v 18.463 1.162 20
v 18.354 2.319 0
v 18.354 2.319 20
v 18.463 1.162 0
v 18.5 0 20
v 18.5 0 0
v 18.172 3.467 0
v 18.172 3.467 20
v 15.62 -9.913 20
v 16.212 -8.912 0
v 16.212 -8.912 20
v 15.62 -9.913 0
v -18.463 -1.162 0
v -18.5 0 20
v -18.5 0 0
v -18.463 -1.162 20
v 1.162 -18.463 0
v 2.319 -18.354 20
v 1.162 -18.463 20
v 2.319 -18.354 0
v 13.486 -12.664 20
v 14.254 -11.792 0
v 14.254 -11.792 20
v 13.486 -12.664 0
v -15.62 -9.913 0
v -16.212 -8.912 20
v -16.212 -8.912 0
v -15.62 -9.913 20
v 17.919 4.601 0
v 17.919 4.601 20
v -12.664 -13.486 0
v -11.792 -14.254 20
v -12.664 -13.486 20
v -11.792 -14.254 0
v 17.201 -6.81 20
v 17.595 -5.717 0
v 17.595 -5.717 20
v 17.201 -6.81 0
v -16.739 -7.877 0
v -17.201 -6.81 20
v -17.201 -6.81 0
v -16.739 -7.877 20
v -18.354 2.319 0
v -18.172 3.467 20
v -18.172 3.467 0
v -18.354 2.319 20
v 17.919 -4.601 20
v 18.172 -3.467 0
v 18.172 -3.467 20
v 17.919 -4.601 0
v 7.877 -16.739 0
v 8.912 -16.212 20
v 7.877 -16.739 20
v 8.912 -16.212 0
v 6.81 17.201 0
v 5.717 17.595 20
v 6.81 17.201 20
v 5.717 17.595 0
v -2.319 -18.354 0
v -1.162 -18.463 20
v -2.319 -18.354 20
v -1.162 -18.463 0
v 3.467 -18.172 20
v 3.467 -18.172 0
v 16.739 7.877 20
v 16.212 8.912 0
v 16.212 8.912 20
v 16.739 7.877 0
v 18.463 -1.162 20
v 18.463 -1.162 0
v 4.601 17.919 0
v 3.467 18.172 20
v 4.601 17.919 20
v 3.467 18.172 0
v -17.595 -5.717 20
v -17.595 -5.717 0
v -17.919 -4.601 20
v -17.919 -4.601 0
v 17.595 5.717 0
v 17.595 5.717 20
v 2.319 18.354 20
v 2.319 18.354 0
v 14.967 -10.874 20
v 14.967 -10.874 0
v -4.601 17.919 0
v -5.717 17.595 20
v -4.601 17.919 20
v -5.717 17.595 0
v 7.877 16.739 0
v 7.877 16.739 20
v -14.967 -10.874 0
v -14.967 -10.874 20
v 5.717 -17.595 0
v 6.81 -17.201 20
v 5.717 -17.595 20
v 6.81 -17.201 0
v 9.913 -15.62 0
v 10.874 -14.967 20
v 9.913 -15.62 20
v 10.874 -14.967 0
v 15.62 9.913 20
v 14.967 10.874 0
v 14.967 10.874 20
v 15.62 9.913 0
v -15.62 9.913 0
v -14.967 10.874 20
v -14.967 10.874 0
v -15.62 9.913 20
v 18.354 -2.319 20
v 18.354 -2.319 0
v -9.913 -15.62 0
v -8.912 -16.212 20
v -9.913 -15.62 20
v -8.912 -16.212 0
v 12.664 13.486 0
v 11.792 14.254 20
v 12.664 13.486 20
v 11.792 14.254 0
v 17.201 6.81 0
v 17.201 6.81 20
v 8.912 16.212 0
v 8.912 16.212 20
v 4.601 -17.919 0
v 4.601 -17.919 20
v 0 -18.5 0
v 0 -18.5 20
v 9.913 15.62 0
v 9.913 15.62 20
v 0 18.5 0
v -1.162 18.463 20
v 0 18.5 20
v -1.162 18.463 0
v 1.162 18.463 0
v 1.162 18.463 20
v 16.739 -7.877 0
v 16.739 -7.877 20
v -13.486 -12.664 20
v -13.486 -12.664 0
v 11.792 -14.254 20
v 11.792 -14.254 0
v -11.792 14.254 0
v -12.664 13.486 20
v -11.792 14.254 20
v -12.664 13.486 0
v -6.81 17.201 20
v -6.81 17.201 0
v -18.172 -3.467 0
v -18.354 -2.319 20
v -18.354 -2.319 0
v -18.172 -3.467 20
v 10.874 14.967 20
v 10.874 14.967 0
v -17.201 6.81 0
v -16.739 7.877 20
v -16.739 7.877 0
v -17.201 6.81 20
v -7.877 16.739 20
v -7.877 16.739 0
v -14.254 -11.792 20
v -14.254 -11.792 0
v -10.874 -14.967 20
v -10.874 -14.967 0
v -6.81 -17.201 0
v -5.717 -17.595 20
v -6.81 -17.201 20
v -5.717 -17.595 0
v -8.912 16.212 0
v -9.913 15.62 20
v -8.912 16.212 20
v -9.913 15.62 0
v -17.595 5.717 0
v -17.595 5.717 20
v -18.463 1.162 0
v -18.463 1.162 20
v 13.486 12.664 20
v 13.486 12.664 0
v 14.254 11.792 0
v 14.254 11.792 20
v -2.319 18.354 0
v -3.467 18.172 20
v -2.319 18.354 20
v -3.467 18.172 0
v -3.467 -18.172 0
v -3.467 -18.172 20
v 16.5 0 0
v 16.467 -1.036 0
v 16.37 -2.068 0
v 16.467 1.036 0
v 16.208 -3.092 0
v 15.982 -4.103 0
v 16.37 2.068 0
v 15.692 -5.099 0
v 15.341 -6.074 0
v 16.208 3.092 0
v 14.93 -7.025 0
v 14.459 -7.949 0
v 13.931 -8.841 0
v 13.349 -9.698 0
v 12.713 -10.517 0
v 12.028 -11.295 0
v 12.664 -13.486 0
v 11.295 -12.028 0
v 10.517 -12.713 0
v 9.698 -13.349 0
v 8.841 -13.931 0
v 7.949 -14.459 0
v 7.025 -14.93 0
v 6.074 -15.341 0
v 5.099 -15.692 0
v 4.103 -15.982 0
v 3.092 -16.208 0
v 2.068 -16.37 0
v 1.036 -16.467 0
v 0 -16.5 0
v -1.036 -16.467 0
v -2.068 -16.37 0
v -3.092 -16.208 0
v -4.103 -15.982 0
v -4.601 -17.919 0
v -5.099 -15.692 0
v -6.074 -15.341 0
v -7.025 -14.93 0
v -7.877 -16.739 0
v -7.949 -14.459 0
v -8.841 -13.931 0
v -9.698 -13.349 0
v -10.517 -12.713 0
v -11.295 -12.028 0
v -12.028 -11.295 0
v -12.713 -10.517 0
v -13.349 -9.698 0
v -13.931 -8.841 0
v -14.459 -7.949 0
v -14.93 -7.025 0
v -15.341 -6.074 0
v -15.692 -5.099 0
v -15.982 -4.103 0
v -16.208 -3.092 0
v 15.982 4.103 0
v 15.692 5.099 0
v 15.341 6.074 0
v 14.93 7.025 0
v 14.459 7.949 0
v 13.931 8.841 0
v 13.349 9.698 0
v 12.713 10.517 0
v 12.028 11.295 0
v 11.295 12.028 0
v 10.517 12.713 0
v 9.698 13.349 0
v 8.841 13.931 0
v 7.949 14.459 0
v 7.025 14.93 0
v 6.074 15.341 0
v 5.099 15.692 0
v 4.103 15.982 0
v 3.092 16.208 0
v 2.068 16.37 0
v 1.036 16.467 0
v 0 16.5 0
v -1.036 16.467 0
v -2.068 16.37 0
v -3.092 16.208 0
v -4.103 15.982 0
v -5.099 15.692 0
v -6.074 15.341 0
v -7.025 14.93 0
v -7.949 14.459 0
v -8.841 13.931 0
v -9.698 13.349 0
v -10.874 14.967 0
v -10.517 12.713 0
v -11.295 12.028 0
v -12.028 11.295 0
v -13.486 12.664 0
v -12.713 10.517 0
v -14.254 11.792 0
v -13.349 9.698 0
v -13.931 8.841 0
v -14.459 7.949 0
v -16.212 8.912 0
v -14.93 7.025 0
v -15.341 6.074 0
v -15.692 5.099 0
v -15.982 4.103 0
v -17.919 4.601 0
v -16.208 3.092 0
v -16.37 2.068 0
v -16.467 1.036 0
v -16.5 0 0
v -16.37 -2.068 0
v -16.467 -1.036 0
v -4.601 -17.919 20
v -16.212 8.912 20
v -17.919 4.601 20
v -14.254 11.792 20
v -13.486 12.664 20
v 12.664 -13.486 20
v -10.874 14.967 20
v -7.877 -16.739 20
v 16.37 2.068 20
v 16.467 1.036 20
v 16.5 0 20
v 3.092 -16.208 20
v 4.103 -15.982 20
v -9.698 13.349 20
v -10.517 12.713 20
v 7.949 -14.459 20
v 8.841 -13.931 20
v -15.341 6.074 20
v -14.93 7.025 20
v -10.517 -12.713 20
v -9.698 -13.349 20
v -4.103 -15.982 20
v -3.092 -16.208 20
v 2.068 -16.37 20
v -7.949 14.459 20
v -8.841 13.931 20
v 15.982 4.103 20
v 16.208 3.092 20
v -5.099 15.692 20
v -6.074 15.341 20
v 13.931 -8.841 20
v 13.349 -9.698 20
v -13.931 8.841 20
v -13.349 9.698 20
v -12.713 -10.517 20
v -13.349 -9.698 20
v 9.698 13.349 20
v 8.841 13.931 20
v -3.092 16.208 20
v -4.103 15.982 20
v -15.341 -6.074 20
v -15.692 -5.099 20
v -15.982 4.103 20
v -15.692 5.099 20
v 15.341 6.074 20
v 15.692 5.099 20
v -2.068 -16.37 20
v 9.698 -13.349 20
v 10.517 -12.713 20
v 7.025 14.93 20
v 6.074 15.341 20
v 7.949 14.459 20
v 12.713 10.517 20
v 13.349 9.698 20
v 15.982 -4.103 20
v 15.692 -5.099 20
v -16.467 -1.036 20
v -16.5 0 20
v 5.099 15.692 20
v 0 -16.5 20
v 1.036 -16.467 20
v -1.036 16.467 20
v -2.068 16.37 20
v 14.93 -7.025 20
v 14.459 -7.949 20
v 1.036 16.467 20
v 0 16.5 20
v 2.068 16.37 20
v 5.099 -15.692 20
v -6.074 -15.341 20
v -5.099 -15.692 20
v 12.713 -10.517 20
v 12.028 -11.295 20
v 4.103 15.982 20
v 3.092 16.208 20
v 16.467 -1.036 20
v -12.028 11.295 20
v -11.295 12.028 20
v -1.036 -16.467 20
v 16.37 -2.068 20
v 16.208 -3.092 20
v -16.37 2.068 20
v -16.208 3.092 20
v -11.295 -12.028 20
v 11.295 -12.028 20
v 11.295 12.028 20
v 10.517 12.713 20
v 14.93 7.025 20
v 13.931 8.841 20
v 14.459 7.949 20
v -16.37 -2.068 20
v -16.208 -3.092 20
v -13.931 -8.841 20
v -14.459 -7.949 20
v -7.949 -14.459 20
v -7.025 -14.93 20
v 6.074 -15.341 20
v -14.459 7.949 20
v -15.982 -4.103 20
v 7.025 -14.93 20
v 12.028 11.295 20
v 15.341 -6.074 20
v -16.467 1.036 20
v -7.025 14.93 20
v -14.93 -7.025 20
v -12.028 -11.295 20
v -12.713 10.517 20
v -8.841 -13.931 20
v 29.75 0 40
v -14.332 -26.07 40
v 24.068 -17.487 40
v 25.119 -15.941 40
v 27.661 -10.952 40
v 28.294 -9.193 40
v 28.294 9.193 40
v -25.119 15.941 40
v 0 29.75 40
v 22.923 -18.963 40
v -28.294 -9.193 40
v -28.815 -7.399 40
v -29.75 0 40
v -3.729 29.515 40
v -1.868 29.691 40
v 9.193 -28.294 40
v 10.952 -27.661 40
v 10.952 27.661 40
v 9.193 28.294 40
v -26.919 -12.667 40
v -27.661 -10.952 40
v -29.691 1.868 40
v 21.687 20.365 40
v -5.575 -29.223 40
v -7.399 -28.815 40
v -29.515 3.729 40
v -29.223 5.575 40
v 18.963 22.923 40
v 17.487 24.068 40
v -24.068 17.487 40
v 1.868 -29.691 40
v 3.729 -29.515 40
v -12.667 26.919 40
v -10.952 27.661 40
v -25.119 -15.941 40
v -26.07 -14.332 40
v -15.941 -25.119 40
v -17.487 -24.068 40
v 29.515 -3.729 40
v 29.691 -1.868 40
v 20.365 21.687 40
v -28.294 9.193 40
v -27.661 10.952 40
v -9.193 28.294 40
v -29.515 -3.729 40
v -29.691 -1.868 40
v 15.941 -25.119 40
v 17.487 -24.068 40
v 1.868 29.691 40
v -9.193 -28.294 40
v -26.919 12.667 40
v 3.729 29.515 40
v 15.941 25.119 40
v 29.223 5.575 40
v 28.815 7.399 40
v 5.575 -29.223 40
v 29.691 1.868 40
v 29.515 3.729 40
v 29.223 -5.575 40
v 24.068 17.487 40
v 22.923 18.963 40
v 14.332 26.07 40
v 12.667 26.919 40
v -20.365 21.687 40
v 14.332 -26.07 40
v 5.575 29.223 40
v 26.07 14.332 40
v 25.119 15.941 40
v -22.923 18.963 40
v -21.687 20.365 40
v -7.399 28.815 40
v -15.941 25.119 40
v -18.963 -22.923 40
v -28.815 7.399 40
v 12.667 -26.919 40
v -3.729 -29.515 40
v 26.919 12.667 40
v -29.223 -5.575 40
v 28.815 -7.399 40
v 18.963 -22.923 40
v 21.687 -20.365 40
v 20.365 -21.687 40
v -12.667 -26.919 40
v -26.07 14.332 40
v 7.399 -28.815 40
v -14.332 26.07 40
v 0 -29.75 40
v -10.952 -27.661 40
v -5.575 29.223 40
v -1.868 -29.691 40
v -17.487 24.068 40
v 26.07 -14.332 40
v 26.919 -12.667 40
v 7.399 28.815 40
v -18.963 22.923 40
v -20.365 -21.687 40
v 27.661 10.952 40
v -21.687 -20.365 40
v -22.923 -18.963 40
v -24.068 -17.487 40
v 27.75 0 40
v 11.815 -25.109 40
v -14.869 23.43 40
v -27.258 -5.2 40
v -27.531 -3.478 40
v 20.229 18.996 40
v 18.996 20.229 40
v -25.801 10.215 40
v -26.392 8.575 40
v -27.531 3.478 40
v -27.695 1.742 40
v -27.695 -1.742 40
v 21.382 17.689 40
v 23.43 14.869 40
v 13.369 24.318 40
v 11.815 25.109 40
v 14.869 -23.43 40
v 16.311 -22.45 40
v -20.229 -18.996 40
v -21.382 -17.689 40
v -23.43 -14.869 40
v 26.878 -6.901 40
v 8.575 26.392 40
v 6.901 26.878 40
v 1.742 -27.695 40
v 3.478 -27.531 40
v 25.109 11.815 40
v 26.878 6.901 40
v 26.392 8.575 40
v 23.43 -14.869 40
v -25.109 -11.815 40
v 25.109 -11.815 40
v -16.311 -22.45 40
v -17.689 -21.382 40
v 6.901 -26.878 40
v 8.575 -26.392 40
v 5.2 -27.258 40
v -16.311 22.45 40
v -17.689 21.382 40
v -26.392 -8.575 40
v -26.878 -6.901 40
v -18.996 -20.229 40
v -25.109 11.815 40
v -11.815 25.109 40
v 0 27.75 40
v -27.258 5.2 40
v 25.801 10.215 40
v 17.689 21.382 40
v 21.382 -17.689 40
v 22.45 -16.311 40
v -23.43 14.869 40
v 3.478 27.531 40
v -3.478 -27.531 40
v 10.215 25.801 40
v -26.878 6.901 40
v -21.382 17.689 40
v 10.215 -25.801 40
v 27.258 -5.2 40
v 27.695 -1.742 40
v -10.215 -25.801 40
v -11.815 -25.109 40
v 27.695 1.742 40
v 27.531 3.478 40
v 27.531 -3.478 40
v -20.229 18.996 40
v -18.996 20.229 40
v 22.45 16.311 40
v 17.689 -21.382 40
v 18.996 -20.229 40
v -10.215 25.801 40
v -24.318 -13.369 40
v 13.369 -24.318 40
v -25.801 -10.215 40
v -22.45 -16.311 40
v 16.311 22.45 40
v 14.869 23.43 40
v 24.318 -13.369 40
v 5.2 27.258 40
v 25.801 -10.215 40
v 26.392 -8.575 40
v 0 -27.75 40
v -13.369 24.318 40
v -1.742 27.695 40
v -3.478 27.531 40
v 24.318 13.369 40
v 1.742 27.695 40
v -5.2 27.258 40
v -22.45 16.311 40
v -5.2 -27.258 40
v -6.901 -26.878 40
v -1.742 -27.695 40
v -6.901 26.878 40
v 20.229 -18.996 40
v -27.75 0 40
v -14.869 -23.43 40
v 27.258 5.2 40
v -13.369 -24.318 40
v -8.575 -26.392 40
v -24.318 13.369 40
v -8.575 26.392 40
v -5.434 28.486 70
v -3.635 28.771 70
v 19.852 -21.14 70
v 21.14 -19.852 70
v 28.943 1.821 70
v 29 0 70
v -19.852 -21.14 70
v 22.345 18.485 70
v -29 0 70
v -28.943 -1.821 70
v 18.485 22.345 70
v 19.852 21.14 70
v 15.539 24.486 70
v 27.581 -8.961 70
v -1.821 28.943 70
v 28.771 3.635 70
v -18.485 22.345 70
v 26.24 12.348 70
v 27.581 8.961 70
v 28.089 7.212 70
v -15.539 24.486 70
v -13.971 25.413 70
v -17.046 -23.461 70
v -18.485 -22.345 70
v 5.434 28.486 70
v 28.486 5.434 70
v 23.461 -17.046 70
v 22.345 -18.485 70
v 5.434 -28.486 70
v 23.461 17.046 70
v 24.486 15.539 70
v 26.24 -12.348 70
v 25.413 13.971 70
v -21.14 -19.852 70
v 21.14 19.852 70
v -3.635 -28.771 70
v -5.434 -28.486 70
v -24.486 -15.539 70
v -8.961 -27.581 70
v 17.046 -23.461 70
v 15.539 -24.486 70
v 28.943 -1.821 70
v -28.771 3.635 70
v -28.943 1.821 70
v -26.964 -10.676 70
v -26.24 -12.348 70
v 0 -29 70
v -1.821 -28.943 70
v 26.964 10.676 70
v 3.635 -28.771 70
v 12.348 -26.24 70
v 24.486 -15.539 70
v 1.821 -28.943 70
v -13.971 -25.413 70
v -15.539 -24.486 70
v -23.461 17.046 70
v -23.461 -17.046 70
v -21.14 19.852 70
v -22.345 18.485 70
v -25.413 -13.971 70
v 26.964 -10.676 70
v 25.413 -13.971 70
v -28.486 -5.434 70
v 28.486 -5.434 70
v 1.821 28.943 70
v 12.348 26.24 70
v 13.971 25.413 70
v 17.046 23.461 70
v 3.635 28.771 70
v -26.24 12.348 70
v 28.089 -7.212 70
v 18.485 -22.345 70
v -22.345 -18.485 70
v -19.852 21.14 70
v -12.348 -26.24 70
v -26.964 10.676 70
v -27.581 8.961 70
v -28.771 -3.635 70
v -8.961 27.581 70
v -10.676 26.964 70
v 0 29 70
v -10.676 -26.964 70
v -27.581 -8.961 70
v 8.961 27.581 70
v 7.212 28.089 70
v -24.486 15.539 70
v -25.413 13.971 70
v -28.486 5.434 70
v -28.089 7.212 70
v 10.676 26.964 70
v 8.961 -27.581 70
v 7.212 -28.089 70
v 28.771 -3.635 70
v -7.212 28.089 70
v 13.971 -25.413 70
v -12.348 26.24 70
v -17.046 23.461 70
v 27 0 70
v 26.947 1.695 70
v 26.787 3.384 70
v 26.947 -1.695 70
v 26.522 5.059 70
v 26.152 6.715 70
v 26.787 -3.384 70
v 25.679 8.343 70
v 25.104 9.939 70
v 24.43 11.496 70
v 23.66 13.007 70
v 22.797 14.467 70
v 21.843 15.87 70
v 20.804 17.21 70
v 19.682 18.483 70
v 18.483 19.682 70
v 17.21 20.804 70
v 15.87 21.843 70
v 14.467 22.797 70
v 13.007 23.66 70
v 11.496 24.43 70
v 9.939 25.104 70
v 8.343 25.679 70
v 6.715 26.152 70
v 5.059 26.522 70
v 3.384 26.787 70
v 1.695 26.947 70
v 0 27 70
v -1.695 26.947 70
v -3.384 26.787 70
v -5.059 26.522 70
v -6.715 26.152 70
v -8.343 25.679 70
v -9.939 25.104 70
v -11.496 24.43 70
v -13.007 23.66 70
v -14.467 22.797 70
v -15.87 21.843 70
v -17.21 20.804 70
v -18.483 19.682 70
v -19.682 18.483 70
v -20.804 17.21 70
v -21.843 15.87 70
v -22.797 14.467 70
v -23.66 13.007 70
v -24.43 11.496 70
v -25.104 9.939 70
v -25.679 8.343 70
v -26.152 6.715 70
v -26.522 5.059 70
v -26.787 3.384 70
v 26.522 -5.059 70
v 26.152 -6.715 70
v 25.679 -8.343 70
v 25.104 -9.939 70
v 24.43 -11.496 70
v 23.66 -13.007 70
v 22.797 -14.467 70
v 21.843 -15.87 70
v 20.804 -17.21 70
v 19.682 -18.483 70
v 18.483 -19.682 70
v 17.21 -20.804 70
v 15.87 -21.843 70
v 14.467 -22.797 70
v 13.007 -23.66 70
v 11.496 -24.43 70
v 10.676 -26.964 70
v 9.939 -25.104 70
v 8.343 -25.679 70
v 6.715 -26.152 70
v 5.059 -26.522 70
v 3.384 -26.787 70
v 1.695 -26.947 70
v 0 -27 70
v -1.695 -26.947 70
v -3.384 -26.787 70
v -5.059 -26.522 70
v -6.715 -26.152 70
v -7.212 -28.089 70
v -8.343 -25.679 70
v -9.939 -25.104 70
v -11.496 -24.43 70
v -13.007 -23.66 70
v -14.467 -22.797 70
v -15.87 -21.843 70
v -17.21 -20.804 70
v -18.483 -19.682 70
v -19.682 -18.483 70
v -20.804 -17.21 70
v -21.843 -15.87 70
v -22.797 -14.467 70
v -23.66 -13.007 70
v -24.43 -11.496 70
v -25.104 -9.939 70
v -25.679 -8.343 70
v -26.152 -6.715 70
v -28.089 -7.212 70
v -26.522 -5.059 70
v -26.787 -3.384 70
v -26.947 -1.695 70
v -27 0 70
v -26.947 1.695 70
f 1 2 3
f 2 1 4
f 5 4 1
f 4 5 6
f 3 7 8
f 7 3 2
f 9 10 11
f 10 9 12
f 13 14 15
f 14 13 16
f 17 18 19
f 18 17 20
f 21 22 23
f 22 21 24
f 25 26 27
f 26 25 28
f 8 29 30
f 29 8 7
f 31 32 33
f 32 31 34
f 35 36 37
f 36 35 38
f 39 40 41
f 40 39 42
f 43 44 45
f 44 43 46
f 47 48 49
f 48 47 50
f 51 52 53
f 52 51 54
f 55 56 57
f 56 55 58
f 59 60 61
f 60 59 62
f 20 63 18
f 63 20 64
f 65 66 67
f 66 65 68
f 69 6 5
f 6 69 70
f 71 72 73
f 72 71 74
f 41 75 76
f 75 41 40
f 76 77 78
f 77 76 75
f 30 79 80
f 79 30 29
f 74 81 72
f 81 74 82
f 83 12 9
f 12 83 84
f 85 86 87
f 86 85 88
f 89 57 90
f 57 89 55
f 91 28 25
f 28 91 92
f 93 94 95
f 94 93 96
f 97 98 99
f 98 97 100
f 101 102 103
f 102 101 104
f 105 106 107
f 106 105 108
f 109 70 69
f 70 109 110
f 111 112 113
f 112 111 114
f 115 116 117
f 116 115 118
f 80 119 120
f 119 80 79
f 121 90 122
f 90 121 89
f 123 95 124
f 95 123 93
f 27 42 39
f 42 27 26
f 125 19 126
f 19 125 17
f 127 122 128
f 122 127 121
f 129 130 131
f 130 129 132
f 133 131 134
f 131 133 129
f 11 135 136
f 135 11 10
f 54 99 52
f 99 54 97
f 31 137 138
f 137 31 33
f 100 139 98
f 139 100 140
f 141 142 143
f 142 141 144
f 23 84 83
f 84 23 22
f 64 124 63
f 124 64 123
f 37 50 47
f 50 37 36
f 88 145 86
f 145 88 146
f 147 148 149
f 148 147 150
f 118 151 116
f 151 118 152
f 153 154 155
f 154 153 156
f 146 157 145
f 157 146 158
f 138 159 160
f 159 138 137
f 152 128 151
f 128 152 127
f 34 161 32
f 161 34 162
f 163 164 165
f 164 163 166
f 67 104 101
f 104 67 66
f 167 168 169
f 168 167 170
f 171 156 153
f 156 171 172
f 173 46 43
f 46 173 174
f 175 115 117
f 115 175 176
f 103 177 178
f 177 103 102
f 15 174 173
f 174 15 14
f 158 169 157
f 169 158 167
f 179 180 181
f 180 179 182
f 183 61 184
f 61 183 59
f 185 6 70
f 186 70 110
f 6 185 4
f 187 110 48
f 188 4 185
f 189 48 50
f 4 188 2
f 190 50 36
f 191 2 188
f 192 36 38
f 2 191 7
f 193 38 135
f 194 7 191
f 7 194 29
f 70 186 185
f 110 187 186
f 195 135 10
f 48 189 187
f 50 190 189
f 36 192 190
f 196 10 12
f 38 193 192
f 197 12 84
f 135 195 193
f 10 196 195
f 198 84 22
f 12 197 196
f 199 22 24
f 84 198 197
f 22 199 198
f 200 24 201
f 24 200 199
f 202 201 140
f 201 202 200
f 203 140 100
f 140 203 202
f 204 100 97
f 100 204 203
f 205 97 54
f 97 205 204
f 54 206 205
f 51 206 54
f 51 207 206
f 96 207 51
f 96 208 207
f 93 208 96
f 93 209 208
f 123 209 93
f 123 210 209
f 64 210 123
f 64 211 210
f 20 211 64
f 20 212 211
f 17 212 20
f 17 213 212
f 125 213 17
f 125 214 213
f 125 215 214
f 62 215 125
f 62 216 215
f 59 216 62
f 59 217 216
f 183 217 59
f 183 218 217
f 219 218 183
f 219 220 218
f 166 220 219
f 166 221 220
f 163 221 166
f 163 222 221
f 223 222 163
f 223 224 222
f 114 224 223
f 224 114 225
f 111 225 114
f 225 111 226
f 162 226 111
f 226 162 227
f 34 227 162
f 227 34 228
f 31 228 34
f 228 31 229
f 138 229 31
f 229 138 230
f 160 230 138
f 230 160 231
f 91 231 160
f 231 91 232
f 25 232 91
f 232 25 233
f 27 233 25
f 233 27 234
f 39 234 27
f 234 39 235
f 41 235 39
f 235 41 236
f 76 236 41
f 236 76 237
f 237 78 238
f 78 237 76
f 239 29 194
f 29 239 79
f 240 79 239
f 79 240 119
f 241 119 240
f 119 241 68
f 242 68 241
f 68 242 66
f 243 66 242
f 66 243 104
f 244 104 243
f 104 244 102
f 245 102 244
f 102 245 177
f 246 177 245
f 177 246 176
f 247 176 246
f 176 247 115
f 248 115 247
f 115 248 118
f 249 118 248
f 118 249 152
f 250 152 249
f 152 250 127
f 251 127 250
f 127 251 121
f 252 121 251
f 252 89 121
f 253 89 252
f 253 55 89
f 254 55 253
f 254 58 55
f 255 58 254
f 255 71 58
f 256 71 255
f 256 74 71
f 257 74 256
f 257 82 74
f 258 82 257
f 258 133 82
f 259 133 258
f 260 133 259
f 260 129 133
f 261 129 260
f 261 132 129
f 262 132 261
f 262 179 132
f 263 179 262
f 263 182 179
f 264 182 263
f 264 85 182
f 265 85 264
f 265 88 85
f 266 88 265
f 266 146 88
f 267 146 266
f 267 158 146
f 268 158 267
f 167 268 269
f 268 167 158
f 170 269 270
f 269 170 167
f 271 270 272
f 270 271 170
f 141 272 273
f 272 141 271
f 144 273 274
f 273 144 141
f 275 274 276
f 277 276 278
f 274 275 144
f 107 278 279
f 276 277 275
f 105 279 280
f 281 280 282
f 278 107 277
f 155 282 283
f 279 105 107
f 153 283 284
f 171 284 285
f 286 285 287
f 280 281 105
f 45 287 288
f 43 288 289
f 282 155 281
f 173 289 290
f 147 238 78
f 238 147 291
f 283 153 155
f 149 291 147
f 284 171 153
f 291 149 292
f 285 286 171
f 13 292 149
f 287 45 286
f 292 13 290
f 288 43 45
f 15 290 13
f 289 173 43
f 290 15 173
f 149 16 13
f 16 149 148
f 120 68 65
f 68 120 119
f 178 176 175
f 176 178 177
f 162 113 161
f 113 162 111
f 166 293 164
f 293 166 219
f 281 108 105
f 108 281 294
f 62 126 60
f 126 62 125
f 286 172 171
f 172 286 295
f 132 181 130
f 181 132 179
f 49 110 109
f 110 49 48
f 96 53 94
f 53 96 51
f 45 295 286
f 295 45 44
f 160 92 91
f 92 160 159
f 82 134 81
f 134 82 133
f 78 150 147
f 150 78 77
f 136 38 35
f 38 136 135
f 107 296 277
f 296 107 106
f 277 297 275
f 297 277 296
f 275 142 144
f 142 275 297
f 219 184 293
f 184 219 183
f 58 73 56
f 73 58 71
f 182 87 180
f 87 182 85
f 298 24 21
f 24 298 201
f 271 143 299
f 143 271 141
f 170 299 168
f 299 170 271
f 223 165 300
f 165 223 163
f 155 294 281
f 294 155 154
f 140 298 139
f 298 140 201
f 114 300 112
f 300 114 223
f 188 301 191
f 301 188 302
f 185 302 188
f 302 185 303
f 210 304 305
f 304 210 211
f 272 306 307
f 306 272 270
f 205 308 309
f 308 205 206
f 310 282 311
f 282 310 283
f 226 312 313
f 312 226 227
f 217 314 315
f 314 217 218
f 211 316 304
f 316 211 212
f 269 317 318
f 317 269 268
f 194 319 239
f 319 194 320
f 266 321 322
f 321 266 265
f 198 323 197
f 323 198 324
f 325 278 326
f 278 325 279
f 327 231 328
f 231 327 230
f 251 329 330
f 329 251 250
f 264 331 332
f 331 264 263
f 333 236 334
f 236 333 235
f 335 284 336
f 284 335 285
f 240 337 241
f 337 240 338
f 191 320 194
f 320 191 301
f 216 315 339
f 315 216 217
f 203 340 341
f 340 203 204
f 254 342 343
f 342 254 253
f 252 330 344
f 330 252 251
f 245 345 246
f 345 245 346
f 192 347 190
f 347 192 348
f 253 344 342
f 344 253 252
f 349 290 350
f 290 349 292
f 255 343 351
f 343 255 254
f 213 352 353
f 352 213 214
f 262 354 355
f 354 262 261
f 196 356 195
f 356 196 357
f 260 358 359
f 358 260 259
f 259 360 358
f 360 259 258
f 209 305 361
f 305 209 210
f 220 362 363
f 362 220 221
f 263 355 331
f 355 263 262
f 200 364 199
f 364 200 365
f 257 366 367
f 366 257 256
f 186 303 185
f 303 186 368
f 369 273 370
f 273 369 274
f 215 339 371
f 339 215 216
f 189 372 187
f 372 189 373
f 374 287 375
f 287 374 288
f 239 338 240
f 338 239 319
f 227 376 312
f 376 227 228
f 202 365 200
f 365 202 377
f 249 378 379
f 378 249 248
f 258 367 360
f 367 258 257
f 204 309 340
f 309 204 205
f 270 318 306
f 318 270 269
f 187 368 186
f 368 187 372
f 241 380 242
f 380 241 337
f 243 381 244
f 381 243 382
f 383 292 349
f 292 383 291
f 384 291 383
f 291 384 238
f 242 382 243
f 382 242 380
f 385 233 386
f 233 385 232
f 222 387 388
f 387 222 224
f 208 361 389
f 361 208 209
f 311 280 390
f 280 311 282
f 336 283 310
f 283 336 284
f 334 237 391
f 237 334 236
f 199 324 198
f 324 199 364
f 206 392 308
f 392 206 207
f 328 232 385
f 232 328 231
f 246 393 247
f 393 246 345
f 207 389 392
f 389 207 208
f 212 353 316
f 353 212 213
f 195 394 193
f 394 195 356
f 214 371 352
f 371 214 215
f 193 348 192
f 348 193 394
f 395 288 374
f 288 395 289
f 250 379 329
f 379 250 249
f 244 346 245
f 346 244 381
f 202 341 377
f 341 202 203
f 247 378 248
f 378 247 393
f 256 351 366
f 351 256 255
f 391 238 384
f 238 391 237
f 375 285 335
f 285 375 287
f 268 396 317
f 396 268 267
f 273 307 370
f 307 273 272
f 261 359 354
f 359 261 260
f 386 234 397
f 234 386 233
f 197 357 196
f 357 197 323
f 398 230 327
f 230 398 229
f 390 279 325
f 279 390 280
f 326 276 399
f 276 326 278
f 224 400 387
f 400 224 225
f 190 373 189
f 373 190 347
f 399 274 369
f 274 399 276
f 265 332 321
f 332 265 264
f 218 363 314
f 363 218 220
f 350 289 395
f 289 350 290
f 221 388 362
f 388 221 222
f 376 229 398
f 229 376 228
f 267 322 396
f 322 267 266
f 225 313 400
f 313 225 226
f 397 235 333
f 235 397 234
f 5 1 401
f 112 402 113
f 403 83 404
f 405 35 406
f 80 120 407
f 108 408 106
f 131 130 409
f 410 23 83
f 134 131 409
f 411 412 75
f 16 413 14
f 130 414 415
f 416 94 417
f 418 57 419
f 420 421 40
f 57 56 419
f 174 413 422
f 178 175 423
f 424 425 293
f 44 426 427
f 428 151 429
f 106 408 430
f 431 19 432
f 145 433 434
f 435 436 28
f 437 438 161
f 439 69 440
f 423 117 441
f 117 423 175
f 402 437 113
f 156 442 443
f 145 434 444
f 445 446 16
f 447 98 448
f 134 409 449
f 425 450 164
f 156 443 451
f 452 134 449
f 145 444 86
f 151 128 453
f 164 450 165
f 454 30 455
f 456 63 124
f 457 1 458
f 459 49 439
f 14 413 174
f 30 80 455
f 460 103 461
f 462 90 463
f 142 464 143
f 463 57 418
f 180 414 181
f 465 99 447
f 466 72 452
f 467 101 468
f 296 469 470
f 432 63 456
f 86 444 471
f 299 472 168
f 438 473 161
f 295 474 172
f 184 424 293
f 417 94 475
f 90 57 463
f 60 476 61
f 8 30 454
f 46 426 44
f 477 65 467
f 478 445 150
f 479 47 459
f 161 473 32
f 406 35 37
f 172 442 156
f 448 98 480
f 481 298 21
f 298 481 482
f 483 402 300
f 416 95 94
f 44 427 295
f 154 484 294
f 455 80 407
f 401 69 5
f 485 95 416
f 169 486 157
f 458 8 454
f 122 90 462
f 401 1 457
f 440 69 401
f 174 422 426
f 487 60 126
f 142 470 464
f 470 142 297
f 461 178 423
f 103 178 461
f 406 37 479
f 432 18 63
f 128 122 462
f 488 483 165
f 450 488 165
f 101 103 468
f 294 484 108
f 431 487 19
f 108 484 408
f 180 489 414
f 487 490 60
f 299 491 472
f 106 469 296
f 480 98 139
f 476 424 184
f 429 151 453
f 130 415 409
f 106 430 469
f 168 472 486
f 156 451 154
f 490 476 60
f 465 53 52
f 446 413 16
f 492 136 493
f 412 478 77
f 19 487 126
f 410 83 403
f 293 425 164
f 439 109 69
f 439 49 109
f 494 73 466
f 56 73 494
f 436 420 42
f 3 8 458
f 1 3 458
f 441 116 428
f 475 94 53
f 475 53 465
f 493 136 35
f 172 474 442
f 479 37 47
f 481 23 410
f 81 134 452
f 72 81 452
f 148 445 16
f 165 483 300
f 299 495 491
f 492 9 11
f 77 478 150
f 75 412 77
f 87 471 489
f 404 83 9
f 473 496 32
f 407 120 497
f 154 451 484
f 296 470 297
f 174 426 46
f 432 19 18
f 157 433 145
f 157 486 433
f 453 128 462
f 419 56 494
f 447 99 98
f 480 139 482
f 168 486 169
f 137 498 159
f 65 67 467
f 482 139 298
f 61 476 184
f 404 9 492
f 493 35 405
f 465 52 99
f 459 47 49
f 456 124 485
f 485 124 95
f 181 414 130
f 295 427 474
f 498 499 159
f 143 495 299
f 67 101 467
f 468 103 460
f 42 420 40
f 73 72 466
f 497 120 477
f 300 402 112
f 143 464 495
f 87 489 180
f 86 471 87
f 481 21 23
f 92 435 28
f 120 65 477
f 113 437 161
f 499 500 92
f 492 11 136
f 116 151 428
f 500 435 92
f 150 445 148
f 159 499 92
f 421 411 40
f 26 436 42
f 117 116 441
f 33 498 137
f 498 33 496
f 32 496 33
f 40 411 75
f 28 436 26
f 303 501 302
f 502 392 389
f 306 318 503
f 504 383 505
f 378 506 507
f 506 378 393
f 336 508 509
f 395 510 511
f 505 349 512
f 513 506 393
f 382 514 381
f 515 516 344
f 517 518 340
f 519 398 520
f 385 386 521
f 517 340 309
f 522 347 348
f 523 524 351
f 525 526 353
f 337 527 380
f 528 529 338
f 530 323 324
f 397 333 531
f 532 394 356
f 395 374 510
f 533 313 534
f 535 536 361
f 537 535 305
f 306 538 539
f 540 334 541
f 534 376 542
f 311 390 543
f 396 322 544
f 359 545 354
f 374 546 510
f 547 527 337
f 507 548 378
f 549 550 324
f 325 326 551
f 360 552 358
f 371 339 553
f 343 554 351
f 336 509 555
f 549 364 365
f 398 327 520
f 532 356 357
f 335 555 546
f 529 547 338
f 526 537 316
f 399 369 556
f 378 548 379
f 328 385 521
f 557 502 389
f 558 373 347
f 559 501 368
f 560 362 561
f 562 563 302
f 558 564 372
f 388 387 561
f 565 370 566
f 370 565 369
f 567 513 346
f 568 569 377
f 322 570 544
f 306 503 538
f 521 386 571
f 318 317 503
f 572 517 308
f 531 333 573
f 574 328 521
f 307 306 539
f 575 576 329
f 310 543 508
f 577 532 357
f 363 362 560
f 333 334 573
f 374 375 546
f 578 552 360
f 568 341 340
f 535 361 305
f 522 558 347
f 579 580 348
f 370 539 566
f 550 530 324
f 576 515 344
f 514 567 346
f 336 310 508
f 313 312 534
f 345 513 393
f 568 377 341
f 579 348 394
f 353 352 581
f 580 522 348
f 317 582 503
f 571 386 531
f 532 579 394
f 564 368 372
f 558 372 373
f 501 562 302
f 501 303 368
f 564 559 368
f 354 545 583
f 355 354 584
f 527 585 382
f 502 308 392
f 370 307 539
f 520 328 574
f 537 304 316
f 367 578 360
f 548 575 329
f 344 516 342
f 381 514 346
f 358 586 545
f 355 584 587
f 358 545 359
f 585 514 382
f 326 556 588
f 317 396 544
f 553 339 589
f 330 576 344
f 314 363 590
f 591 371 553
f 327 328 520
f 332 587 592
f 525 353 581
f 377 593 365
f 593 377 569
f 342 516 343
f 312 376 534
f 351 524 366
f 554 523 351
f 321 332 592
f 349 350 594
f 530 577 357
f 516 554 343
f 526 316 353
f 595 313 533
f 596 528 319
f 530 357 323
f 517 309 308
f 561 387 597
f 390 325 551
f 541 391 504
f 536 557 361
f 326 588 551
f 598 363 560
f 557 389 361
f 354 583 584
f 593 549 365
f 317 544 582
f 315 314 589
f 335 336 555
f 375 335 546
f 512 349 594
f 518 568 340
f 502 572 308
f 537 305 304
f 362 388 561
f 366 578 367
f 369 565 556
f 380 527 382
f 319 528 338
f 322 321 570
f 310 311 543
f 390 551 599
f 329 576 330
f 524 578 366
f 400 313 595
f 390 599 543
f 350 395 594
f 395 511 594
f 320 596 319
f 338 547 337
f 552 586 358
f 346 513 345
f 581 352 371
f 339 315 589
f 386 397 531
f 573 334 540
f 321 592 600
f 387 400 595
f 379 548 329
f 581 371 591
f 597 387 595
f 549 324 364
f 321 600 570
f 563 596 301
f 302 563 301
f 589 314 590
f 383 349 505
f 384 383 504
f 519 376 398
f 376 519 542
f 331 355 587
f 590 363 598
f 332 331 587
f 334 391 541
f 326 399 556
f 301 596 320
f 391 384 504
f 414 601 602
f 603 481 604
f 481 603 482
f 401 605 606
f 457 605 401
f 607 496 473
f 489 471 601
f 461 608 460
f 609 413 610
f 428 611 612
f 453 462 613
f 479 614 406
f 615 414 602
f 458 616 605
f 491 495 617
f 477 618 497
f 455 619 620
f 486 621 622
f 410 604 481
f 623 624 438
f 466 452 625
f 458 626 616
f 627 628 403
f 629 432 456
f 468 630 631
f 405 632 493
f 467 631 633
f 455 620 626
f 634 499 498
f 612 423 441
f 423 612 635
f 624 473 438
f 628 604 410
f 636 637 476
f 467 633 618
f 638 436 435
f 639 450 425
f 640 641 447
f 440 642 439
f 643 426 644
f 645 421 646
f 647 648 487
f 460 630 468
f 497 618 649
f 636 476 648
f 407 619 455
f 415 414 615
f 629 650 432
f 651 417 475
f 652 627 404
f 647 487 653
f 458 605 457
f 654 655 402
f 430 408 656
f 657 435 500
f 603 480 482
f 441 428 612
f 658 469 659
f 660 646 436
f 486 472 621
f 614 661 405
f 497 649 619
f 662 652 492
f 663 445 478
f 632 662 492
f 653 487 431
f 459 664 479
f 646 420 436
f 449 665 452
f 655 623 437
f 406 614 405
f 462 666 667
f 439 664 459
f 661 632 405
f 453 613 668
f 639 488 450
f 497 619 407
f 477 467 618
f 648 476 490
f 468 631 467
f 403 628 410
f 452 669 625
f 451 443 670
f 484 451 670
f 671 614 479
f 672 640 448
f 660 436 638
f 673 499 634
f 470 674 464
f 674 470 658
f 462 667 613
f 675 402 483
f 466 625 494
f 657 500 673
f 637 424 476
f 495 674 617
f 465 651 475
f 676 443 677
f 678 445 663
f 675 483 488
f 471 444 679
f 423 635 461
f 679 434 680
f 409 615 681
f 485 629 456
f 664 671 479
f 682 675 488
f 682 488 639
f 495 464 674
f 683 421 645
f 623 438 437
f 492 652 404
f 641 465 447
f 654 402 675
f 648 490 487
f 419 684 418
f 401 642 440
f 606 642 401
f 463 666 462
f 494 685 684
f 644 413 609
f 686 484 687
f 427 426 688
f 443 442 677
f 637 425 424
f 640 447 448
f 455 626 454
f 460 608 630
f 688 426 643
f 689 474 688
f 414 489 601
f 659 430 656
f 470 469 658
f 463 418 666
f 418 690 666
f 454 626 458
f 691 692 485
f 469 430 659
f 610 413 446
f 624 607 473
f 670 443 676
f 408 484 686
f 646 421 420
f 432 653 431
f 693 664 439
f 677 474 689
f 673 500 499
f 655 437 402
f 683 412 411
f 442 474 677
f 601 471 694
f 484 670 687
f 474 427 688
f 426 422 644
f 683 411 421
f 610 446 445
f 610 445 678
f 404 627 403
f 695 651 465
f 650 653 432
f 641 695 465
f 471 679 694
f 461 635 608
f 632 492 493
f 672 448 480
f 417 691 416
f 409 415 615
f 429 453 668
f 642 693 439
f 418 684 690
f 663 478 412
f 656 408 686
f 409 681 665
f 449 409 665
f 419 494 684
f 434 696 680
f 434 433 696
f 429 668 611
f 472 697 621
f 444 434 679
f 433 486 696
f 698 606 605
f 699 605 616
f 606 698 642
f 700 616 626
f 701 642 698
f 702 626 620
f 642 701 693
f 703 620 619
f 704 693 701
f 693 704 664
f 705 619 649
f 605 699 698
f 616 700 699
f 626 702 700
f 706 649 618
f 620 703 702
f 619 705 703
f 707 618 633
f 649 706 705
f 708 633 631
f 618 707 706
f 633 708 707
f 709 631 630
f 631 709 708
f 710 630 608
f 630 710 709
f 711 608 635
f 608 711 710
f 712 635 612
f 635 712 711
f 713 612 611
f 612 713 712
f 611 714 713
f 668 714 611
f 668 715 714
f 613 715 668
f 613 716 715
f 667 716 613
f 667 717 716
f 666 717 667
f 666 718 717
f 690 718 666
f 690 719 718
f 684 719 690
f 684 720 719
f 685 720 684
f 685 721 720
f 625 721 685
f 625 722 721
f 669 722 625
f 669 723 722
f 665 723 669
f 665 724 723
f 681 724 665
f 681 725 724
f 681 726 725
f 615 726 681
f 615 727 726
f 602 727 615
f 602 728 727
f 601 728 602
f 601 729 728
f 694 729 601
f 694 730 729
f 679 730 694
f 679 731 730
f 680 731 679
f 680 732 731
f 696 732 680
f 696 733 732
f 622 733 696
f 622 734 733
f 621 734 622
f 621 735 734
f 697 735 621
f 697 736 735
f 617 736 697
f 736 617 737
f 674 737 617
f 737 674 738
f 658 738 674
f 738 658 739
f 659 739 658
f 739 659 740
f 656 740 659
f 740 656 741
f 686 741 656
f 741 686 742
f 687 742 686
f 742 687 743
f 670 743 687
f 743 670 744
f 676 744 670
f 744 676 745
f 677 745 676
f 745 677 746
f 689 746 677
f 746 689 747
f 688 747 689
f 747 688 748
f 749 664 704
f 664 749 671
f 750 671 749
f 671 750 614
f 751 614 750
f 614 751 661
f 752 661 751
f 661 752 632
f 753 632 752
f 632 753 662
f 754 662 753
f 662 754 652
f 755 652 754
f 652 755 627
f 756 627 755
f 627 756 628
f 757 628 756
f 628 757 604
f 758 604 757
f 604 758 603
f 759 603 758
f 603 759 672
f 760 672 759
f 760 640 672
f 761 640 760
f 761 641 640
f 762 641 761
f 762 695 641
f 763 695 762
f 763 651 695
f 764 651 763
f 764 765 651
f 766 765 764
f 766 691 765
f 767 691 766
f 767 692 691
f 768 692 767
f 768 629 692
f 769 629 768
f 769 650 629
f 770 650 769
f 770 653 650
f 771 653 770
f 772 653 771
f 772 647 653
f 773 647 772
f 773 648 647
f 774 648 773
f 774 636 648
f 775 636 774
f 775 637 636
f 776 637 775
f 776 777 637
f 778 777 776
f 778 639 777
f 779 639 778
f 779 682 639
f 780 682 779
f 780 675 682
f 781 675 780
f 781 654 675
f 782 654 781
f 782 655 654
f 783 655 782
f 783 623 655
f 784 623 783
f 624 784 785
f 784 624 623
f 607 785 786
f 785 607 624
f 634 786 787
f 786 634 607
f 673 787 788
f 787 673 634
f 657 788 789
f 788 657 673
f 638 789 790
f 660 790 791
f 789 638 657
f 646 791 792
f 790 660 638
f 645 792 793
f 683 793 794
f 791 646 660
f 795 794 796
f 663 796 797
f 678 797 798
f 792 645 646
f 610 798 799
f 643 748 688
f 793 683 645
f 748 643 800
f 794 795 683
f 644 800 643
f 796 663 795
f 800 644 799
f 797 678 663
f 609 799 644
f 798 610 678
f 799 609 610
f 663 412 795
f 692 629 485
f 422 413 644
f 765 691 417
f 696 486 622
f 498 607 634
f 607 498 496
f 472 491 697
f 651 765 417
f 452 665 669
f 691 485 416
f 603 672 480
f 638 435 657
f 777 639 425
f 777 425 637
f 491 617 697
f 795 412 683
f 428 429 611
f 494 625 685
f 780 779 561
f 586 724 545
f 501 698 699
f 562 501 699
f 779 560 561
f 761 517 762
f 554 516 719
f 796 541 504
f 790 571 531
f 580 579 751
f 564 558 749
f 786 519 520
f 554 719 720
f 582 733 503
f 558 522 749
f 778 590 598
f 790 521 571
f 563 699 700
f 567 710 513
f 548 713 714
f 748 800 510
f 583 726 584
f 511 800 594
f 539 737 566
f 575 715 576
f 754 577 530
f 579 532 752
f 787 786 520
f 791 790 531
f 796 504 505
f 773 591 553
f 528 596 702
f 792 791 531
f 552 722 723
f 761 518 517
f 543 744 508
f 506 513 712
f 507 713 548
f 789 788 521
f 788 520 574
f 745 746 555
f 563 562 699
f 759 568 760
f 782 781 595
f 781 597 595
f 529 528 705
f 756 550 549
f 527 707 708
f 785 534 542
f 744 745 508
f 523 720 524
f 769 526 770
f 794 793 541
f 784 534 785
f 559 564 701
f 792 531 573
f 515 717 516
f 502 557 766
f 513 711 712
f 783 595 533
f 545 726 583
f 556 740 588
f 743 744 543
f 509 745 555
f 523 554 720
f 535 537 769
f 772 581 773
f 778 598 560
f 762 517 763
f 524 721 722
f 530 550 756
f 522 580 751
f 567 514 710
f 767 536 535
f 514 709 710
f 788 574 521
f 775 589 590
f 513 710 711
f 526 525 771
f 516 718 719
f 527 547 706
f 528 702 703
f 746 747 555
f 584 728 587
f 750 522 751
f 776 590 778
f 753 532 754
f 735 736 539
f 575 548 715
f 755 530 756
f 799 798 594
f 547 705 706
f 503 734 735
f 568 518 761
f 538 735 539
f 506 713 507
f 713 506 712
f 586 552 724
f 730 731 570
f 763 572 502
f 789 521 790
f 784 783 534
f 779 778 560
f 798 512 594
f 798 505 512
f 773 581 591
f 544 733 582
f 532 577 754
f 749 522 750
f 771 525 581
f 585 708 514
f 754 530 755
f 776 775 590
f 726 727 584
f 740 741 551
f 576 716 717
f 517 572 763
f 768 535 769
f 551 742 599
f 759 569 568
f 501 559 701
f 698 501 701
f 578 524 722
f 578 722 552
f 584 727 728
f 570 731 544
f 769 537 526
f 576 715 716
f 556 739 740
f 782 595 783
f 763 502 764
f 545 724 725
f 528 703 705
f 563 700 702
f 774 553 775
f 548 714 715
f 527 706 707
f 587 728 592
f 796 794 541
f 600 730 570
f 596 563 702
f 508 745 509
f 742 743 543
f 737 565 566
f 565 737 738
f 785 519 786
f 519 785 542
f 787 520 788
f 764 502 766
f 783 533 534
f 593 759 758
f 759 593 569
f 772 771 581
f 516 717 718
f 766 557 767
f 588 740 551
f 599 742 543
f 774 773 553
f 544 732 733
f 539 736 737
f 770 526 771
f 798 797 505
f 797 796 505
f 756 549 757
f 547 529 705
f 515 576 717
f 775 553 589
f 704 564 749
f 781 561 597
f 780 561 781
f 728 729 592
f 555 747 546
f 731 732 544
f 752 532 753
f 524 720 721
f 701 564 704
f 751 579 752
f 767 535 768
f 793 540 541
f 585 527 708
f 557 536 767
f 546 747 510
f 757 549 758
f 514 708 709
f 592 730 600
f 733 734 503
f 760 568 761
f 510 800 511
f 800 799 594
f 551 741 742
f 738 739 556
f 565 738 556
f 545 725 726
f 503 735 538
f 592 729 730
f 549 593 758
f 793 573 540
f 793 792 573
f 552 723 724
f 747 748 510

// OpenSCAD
$fn=100;
wall_thickness = 2;
section_length = 20;
end_taper = 1.5;

start_int_dia = 33;
start_ext_dia = start_int_dia + 2 * wall_thickness;
end_ext_dia = 59.5;
end_int_dia = end_ext_dia - 2 * wall_thickness;


module start_tube() {
    difference() {
        cylinder(section_length, d = start_ext_dia);
        cylinder(section_length, d = start_int_dia);
    }
}

module middle_tube() {
    difference() {
        cylinder(section_length, d1 = start_ext_dia, d2 = end_ext_dia);
        cylinder(section_length, d1 = start_int_dia, d2 = end_int_dia);
    }
}

module end_tube() {
    difference() {
        cylinder(section_length*1.5, d1 = end_ext_dia, d2 = end_ext_dia-end_taper);
        cylinder(section_length*1.5, d1 = end_int_dia, d2 = end_int_dia-end_taper);
    }
}

module adaptor() {
    start_tube();
    translate([0, 0, section_length]) middle_tube();
    translate([0, 0, section_length*2]) end_tube();    
}


adaptor();
    
    
